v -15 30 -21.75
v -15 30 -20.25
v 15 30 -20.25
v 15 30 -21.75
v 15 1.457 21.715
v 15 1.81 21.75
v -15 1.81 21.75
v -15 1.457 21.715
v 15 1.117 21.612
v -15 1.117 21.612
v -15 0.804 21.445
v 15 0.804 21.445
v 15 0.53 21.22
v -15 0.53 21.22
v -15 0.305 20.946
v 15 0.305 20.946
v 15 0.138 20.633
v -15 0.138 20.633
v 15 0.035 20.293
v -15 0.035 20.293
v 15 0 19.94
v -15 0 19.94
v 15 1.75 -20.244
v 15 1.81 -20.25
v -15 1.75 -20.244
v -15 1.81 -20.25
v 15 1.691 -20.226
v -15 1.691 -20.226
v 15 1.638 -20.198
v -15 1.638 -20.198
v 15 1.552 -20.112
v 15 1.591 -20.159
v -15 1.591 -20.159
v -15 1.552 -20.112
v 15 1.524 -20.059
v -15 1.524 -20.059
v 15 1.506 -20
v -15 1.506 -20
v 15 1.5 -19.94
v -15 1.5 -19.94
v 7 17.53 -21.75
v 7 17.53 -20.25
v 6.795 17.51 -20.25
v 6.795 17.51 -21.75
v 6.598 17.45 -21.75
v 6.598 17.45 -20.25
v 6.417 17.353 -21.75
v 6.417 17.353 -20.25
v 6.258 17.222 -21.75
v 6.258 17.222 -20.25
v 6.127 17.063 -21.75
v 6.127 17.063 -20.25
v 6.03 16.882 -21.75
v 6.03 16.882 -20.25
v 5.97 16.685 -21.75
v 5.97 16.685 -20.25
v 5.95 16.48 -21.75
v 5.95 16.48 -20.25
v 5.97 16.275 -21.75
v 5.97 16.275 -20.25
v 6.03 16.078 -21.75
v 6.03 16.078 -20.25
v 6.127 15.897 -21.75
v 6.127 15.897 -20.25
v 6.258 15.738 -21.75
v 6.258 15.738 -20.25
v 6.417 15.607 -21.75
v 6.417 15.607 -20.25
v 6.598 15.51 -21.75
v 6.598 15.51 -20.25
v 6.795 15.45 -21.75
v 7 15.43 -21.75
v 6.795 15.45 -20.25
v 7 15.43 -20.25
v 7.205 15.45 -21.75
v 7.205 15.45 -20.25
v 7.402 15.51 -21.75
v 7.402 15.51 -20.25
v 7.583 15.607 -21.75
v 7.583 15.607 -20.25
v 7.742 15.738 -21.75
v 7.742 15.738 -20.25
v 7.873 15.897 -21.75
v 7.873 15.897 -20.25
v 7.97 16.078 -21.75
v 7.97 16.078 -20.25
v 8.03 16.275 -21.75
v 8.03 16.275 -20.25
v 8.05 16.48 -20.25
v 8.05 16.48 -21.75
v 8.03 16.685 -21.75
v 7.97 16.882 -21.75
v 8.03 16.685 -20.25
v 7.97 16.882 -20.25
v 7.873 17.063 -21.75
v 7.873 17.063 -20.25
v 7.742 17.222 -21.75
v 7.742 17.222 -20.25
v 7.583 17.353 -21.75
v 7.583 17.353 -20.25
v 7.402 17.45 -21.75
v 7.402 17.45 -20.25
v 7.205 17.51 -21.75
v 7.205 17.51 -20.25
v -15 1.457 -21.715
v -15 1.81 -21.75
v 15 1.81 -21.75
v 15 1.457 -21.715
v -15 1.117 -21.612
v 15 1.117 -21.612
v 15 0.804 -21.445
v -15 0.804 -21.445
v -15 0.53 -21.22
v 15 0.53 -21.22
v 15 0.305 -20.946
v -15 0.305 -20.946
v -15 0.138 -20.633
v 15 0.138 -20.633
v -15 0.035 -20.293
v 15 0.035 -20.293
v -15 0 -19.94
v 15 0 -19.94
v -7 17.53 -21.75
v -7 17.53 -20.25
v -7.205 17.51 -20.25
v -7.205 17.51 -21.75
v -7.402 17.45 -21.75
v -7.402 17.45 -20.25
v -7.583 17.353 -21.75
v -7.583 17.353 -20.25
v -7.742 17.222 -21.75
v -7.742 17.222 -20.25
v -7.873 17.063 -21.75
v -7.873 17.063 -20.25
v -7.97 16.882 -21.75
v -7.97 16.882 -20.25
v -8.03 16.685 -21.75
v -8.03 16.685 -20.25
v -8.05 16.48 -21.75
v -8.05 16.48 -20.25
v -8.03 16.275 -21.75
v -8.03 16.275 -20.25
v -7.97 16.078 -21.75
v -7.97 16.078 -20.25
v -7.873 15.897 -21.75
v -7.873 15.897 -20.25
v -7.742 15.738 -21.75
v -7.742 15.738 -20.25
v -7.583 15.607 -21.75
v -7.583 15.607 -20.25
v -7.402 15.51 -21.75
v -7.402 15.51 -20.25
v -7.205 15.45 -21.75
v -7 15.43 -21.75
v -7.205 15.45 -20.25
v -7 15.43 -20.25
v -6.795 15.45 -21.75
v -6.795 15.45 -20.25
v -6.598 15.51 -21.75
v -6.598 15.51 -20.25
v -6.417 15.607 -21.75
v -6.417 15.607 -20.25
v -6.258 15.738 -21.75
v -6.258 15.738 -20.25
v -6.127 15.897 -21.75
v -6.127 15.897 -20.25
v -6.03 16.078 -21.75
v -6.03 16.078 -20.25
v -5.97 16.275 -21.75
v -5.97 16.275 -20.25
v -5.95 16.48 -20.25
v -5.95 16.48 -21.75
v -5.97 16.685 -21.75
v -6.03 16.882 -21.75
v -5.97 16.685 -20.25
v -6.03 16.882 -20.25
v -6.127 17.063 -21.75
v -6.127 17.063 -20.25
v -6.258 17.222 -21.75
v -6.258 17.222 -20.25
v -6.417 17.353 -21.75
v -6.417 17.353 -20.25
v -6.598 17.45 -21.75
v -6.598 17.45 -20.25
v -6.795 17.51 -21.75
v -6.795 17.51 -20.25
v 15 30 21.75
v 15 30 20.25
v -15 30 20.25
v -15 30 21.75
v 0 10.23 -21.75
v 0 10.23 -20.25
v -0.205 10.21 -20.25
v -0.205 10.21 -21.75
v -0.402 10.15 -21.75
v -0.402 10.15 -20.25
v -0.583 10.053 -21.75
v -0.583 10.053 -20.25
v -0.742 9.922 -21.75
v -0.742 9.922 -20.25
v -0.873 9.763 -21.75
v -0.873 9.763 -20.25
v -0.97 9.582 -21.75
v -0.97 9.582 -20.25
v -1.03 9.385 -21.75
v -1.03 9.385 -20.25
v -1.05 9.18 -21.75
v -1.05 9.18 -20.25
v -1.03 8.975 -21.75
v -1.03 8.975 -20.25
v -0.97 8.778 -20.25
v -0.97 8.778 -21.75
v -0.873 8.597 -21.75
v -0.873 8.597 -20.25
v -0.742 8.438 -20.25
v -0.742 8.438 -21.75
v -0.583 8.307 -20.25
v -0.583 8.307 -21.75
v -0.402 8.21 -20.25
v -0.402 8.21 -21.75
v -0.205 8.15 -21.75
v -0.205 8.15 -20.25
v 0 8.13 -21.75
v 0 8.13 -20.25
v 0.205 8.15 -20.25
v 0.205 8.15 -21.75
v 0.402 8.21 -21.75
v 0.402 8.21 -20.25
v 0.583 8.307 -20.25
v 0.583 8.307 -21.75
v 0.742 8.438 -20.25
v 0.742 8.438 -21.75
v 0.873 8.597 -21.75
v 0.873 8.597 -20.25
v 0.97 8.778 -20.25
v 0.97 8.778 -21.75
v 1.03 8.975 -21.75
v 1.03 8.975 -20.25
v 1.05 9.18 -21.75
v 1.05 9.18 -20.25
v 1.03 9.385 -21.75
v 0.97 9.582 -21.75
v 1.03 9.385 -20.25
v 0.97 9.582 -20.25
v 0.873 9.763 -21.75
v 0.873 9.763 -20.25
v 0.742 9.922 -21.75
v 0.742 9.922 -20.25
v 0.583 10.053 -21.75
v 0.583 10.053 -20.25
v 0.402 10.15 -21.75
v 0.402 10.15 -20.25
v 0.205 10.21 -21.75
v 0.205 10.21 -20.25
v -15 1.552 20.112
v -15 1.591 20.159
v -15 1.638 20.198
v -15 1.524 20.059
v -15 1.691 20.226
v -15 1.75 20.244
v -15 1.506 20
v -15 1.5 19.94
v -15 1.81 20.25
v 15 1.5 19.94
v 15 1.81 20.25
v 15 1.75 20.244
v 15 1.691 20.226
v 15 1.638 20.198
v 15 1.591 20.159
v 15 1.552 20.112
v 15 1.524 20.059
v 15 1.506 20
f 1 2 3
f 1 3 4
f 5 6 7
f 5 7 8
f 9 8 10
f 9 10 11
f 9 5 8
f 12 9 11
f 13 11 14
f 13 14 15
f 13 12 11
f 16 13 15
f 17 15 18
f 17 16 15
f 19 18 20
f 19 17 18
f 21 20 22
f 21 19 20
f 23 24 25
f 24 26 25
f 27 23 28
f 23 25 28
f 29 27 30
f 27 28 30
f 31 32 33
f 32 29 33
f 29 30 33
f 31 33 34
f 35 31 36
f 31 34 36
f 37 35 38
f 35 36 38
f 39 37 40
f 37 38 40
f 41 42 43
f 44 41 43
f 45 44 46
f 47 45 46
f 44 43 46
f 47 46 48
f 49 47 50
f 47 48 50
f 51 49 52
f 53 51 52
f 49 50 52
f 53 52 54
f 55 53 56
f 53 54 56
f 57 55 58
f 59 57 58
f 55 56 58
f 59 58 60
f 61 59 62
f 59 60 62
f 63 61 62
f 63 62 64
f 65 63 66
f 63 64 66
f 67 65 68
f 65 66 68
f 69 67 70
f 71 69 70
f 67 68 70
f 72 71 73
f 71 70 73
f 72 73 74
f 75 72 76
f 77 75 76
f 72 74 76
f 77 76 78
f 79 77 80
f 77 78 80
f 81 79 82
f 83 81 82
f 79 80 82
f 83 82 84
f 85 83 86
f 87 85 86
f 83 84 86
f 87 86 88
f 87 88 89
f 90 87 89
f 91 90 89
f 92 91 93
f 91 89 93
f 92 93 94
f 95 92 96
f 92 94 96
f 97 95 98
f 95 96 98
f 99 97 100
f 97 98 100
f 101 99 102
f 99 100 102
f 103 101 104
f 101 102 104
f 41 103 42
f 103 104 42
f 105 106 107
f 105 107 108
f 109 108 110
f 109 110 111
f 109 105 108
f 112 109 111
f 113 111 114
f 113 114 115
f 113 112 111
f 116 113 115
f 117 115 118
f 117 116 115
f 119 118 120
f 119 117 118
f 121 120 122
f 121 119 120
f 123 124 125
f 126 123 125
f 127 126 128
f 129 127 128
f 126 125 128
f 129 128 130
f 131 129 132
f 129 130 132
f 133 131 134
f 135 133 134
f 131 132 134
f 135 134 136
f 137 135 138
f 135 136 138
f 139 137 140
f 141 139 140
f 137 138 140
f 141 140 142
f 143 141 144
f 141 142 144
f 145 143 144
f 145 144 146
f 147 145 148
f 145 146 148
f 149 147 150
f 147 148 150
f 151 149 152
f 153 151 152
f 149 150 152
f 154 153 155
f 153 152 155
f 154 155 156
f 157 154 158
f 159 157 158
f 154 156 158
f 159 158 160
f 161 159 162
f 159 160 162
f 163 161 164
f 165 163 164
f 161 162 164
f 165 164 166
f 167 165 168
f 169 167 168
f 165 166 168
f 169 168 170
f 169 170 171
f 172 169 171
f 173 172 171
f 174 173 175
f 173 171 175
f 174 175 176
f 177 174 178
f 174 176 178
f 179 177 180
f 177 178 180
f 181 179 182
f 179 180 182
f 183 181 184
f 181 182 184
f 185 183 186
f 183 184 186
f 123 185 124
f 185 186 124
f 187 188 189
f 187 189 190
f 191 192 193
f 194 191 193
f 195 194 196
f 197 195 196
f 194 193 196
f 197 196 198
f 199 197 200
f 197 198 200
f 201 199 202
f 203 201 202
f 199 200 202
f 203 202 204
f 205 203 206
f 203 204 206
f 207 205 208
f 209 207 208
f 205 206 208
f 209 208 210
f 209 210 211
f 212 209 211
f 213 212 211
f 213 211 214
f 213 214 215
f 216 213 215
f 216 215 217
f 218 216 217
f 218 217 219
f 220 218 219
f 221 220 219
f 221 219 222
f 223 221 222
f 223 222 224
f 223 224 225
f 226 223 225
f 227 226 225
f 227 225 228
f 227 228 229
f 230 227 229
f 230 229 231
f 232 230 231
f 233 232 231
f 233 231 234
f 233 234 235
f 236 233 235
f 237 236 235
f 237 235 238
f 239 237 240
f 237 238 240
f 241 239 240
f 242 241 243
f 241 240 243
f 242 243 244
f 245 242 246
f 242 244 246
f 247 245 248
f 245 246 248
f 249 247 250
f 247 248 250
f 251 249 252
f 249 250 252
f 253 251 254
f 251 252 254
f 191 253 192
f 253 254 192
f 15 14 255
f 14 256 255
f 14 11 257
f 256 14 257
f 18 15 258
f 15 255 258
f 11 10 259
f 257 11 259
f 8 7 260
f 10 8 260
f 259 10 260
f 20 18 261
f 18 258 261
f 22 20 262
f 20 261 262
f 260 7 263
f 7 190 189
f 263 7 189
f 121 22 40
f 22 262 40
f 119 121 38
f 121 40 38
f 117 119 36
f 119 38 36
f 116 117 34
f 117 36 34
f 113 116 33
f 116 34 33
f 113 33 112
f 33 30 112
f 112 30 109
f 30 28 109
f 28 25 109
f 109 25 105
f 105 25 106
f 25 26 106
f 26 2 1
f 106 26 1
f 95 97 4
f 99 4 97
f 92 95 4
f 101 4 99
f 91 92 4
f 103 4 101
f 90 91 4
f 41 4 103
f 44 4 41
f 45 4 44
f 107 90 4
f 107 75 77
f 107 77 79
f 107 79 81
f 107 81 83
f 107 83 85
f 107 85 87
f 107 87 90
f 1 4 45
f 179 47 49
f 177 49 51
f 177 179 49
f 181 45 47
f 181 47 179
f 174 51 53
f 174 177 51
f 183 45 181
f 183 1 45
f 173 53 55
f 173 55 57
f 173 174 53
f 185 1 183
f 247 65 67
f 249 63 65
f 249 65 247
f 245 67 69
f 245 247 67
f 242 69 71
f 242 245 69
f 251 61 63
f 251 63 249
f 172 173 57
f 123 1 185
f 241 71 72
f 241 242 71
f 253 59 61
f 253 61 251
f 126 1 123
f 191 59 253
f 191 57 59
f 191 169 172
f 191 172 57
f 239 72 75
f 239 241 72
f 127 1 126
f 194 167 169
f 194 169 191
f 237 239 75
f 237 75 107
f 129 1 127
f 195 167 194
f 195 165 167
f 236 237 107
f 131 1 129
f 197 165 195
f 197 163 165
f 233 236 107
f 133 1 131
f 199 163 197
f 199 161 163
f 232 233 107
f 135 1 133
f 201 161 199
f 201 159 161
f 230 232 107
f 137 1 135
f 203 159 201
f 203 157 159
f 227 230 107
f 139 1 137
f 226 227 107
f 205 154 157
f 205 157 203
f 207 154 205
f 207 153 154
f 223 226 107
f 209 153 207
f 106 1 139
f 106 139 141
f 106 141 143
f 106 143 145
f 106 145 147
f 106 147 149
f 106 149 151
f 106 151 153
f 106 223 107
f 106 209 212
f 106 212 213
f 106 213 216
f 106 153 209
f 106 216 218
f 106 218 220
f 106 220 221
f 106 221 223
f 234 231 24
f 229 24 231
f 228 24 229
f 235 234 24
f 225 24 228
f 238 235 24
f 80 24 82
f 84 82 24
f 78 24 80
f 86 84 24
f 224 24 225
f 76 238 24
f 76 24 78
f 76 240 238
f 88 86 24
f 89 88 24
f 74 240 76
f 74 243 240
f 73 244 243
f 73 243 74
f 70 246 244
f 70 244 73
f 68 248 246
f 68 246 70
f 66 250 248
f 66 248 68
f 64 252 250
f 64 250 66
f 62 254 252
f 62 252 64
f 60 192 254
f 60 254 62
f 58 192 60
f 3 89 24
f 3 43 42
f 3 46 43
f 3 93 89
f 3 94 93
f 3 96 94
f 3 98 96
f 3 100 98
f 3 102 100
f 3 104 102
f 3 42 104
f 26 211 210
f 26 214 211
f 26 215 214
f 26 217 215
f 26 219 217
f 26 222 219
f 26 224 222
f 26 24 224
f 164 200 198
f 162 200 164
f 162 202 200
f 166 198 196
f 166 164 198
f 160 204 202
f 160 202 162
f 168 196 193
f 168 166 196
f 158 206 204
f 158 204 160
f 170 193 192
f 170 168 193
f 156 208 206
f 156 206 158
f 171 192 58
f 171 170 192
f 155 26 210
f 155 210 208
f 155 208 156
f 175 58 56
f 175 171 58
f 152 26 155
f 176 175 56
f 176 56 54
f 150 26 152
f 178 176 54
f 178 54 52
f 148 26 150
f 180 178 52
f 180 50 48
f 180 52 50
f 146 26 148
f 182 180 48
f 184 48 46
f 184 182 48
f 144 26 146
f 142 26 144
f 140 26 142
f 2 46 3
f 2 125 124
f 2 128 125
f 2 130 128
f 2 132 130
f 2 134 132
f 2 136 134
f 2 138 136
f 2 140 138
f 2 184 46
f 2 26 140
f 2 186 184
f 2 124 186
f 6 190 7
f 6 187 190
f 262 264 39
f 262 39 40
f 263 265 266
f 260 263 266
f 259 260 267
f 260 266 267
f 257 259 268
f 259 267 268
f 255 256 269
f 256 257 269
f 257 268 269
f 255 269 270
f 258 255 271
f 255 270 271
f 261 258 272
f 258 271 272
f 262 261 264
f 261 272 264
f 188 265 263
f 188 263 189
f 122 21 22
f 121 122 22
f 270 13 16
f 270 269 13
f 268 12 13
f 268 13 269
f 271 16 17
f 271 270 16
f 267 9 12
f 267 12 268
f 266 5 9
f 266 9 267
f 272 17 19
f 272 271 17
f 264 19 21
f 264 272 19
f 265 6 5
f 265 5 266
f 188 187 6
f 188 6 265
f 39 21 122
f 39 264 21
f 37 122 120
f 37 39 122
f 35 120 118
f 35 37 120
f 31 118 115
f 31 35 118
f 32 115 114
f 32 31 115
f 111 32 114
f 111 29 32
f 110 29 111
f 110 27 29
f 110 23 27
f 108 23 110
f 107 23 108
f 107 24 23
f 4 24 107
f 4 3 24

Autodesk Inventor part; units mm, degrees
ref_plane "YZ Plane" through (0, 0, 0) normal (1, 0, 0) x (0, 1, 0)
ref_plane "XZ Plane" through (0, 0, 0) normal (0, 1, 0) x (-1, 0, 0)
ref_plane "XY Plane" through (0, 0, 0) normal (0, 0, 1) x (1, 0, 0)
sketch "Sketch1" plane through (0, 0, 0) normal (0, 1, 0) x (-1, 0, 0)
  line L0 (15, 20.25) -> (-15, 20.25)
  line L1 (-15, 20.25) -> (-15, -20.25)
  line L2 (-15, -20.25) -> (15, -20.25)
  line L3 (15, -20.25) -> (15, 20.25)
  point P0 (0, 0)
  point P1 (15, 0)
  point P2 (0, 20.25)
  dimension "d0" = 30
  dimension "d1" = 40.5
extrude "Plate1" add sketch "Sketch1" along normal blind 1.5
sketch "Sketch2" plane through (15, 0, 21.75) normal (0, 0, -1) x (-1, 0, 0)
  line L0 (30, 0) -> (0, 0)
  line L1 (0, 0) -> (0, 30)
  line L2 (0, 30) -> (30, 30)
  line L3 (30, 30) -> (30, 0)
edge flange "Flange1" height 30 angle 90 thickness 1.5 bend radius 0.31 thickness toward (0, 0, -1) relief tear relief width 1.5 relief depth 0.75 corner gap 0.31 corner form 0 edges at (0, 1.5, 20.25) (0, 1.5, -20.25) wall of the first edge with corners at (-15, 0, 21.75) (15, 0, 21.75) (15, 30, 21.75) (-15, 30, 21.75)
bend "Bend1"
corner "Corner1"
sketch "Sketch3" plane through (15, 30, -21.75) normal (0, 0, -1) x (-1, 0, 0)
  circle A0 centre (15, -20.82) radius 0.7835 projected
  circle A1 centre (8, -13.52) radius 0.7835 projected
  circle A2 centre (22, -13.52) radius 0.7835 projected
  circle A3 centre (7, -0.3) radius 0.7835 projected
  circle A4 centre (23, -0.3) radius 0.7835 projected
  line L0 (21.07, -22.22) -> (8.93, -22.22) projected
  line L1 (21.07, -22.22) -> (21.07, -21.5) projected
  arc A5 (23.07, -19.5) -> (21.07, -21.5) centre (23.07, -21.5) ccw projected
  line L2 (23.07, -19.5) -> (23.79, -19.5) projected
  line L3 (23.79, 12.6) -> (23.79, -19.5) projected
  line L4 (23.79, 12.6) -> (23.07, 12.6) projected
  arc A6 (21.07, 14.6) -> (23.07, 12.6) centre (23.07, 14.6) ccw projected
  line L5 (21.07, 14.6) -> (21.07, 15.32) projected
  line L6 (8.93, 15.32) -> (21.07, 15.32) projected
  line L7 (8.93, 15.32) -> (8.93, 14.6) projected
  arc A7 (6.93, 12.6) -> (8.93, 14.6) centre (6.93, 14.6) ccw projected
  line L8 (6.93, 12.6) -> (6.21, 12.6) projected
  line L9 (6.21, -19.5) -> (6.21, 12.6) projected
  line L10 (6.21, -19.5) -> (6.93, -19.5) projected
  arc A8 (8.93, -21.5) -> (6.93, -19.5) centre (6.93, -21.5) ccw projected
  line L11 (8.93, -21.5) -> (8.93, -22.22) projected
  circle A9 centre (15, 6.6) radius 6.4 projected
  point P0 (15, -30)
hole "Hole1" at (-7, 16.48, -21.75) at (0, 9.18, -21.75) at (7, 16.48, -21.75) direction (0, 0, 1) diameter 2.1 depth 1.5
equation "\"d18\" = Thickness"
equation "\"d2\" = Thickness"
equation "\"d3\" = BendReliefWidth"
equation "\"d4\" = BendReliefDepth"
equation "\"d5\" = MinimumRemnant"
equation "\"d6\" = TransitionRadius"
equation "\"d9\" = BendRadius"
equation "\"d10\" = CornerReliefSize"
equation "\"d11\" = GapSize"
equation "\"d12\" = JacobiRadiusSize"
equation "\"BendReliefWidth\" = Thickness"
equation "\"BendReliefDepth\" = 0.5 * Thickness"
equation "\"CornerReliefSize\" = 4 * Thickness"
equation "\"MinimumRemnant\" = 2 * Thickness"
equation "\"TransitionRadius\" = BendRadius"
equation "\"JacobiRadiusSize\" = BendRadius"
equation "\"GapSize\" = Thickness"
equation "\"Thickness\" = 1.5"
equation "\"BendRadius\" = 0.31"
properties part number "chris" material "Aluminum 6061-AHC"
